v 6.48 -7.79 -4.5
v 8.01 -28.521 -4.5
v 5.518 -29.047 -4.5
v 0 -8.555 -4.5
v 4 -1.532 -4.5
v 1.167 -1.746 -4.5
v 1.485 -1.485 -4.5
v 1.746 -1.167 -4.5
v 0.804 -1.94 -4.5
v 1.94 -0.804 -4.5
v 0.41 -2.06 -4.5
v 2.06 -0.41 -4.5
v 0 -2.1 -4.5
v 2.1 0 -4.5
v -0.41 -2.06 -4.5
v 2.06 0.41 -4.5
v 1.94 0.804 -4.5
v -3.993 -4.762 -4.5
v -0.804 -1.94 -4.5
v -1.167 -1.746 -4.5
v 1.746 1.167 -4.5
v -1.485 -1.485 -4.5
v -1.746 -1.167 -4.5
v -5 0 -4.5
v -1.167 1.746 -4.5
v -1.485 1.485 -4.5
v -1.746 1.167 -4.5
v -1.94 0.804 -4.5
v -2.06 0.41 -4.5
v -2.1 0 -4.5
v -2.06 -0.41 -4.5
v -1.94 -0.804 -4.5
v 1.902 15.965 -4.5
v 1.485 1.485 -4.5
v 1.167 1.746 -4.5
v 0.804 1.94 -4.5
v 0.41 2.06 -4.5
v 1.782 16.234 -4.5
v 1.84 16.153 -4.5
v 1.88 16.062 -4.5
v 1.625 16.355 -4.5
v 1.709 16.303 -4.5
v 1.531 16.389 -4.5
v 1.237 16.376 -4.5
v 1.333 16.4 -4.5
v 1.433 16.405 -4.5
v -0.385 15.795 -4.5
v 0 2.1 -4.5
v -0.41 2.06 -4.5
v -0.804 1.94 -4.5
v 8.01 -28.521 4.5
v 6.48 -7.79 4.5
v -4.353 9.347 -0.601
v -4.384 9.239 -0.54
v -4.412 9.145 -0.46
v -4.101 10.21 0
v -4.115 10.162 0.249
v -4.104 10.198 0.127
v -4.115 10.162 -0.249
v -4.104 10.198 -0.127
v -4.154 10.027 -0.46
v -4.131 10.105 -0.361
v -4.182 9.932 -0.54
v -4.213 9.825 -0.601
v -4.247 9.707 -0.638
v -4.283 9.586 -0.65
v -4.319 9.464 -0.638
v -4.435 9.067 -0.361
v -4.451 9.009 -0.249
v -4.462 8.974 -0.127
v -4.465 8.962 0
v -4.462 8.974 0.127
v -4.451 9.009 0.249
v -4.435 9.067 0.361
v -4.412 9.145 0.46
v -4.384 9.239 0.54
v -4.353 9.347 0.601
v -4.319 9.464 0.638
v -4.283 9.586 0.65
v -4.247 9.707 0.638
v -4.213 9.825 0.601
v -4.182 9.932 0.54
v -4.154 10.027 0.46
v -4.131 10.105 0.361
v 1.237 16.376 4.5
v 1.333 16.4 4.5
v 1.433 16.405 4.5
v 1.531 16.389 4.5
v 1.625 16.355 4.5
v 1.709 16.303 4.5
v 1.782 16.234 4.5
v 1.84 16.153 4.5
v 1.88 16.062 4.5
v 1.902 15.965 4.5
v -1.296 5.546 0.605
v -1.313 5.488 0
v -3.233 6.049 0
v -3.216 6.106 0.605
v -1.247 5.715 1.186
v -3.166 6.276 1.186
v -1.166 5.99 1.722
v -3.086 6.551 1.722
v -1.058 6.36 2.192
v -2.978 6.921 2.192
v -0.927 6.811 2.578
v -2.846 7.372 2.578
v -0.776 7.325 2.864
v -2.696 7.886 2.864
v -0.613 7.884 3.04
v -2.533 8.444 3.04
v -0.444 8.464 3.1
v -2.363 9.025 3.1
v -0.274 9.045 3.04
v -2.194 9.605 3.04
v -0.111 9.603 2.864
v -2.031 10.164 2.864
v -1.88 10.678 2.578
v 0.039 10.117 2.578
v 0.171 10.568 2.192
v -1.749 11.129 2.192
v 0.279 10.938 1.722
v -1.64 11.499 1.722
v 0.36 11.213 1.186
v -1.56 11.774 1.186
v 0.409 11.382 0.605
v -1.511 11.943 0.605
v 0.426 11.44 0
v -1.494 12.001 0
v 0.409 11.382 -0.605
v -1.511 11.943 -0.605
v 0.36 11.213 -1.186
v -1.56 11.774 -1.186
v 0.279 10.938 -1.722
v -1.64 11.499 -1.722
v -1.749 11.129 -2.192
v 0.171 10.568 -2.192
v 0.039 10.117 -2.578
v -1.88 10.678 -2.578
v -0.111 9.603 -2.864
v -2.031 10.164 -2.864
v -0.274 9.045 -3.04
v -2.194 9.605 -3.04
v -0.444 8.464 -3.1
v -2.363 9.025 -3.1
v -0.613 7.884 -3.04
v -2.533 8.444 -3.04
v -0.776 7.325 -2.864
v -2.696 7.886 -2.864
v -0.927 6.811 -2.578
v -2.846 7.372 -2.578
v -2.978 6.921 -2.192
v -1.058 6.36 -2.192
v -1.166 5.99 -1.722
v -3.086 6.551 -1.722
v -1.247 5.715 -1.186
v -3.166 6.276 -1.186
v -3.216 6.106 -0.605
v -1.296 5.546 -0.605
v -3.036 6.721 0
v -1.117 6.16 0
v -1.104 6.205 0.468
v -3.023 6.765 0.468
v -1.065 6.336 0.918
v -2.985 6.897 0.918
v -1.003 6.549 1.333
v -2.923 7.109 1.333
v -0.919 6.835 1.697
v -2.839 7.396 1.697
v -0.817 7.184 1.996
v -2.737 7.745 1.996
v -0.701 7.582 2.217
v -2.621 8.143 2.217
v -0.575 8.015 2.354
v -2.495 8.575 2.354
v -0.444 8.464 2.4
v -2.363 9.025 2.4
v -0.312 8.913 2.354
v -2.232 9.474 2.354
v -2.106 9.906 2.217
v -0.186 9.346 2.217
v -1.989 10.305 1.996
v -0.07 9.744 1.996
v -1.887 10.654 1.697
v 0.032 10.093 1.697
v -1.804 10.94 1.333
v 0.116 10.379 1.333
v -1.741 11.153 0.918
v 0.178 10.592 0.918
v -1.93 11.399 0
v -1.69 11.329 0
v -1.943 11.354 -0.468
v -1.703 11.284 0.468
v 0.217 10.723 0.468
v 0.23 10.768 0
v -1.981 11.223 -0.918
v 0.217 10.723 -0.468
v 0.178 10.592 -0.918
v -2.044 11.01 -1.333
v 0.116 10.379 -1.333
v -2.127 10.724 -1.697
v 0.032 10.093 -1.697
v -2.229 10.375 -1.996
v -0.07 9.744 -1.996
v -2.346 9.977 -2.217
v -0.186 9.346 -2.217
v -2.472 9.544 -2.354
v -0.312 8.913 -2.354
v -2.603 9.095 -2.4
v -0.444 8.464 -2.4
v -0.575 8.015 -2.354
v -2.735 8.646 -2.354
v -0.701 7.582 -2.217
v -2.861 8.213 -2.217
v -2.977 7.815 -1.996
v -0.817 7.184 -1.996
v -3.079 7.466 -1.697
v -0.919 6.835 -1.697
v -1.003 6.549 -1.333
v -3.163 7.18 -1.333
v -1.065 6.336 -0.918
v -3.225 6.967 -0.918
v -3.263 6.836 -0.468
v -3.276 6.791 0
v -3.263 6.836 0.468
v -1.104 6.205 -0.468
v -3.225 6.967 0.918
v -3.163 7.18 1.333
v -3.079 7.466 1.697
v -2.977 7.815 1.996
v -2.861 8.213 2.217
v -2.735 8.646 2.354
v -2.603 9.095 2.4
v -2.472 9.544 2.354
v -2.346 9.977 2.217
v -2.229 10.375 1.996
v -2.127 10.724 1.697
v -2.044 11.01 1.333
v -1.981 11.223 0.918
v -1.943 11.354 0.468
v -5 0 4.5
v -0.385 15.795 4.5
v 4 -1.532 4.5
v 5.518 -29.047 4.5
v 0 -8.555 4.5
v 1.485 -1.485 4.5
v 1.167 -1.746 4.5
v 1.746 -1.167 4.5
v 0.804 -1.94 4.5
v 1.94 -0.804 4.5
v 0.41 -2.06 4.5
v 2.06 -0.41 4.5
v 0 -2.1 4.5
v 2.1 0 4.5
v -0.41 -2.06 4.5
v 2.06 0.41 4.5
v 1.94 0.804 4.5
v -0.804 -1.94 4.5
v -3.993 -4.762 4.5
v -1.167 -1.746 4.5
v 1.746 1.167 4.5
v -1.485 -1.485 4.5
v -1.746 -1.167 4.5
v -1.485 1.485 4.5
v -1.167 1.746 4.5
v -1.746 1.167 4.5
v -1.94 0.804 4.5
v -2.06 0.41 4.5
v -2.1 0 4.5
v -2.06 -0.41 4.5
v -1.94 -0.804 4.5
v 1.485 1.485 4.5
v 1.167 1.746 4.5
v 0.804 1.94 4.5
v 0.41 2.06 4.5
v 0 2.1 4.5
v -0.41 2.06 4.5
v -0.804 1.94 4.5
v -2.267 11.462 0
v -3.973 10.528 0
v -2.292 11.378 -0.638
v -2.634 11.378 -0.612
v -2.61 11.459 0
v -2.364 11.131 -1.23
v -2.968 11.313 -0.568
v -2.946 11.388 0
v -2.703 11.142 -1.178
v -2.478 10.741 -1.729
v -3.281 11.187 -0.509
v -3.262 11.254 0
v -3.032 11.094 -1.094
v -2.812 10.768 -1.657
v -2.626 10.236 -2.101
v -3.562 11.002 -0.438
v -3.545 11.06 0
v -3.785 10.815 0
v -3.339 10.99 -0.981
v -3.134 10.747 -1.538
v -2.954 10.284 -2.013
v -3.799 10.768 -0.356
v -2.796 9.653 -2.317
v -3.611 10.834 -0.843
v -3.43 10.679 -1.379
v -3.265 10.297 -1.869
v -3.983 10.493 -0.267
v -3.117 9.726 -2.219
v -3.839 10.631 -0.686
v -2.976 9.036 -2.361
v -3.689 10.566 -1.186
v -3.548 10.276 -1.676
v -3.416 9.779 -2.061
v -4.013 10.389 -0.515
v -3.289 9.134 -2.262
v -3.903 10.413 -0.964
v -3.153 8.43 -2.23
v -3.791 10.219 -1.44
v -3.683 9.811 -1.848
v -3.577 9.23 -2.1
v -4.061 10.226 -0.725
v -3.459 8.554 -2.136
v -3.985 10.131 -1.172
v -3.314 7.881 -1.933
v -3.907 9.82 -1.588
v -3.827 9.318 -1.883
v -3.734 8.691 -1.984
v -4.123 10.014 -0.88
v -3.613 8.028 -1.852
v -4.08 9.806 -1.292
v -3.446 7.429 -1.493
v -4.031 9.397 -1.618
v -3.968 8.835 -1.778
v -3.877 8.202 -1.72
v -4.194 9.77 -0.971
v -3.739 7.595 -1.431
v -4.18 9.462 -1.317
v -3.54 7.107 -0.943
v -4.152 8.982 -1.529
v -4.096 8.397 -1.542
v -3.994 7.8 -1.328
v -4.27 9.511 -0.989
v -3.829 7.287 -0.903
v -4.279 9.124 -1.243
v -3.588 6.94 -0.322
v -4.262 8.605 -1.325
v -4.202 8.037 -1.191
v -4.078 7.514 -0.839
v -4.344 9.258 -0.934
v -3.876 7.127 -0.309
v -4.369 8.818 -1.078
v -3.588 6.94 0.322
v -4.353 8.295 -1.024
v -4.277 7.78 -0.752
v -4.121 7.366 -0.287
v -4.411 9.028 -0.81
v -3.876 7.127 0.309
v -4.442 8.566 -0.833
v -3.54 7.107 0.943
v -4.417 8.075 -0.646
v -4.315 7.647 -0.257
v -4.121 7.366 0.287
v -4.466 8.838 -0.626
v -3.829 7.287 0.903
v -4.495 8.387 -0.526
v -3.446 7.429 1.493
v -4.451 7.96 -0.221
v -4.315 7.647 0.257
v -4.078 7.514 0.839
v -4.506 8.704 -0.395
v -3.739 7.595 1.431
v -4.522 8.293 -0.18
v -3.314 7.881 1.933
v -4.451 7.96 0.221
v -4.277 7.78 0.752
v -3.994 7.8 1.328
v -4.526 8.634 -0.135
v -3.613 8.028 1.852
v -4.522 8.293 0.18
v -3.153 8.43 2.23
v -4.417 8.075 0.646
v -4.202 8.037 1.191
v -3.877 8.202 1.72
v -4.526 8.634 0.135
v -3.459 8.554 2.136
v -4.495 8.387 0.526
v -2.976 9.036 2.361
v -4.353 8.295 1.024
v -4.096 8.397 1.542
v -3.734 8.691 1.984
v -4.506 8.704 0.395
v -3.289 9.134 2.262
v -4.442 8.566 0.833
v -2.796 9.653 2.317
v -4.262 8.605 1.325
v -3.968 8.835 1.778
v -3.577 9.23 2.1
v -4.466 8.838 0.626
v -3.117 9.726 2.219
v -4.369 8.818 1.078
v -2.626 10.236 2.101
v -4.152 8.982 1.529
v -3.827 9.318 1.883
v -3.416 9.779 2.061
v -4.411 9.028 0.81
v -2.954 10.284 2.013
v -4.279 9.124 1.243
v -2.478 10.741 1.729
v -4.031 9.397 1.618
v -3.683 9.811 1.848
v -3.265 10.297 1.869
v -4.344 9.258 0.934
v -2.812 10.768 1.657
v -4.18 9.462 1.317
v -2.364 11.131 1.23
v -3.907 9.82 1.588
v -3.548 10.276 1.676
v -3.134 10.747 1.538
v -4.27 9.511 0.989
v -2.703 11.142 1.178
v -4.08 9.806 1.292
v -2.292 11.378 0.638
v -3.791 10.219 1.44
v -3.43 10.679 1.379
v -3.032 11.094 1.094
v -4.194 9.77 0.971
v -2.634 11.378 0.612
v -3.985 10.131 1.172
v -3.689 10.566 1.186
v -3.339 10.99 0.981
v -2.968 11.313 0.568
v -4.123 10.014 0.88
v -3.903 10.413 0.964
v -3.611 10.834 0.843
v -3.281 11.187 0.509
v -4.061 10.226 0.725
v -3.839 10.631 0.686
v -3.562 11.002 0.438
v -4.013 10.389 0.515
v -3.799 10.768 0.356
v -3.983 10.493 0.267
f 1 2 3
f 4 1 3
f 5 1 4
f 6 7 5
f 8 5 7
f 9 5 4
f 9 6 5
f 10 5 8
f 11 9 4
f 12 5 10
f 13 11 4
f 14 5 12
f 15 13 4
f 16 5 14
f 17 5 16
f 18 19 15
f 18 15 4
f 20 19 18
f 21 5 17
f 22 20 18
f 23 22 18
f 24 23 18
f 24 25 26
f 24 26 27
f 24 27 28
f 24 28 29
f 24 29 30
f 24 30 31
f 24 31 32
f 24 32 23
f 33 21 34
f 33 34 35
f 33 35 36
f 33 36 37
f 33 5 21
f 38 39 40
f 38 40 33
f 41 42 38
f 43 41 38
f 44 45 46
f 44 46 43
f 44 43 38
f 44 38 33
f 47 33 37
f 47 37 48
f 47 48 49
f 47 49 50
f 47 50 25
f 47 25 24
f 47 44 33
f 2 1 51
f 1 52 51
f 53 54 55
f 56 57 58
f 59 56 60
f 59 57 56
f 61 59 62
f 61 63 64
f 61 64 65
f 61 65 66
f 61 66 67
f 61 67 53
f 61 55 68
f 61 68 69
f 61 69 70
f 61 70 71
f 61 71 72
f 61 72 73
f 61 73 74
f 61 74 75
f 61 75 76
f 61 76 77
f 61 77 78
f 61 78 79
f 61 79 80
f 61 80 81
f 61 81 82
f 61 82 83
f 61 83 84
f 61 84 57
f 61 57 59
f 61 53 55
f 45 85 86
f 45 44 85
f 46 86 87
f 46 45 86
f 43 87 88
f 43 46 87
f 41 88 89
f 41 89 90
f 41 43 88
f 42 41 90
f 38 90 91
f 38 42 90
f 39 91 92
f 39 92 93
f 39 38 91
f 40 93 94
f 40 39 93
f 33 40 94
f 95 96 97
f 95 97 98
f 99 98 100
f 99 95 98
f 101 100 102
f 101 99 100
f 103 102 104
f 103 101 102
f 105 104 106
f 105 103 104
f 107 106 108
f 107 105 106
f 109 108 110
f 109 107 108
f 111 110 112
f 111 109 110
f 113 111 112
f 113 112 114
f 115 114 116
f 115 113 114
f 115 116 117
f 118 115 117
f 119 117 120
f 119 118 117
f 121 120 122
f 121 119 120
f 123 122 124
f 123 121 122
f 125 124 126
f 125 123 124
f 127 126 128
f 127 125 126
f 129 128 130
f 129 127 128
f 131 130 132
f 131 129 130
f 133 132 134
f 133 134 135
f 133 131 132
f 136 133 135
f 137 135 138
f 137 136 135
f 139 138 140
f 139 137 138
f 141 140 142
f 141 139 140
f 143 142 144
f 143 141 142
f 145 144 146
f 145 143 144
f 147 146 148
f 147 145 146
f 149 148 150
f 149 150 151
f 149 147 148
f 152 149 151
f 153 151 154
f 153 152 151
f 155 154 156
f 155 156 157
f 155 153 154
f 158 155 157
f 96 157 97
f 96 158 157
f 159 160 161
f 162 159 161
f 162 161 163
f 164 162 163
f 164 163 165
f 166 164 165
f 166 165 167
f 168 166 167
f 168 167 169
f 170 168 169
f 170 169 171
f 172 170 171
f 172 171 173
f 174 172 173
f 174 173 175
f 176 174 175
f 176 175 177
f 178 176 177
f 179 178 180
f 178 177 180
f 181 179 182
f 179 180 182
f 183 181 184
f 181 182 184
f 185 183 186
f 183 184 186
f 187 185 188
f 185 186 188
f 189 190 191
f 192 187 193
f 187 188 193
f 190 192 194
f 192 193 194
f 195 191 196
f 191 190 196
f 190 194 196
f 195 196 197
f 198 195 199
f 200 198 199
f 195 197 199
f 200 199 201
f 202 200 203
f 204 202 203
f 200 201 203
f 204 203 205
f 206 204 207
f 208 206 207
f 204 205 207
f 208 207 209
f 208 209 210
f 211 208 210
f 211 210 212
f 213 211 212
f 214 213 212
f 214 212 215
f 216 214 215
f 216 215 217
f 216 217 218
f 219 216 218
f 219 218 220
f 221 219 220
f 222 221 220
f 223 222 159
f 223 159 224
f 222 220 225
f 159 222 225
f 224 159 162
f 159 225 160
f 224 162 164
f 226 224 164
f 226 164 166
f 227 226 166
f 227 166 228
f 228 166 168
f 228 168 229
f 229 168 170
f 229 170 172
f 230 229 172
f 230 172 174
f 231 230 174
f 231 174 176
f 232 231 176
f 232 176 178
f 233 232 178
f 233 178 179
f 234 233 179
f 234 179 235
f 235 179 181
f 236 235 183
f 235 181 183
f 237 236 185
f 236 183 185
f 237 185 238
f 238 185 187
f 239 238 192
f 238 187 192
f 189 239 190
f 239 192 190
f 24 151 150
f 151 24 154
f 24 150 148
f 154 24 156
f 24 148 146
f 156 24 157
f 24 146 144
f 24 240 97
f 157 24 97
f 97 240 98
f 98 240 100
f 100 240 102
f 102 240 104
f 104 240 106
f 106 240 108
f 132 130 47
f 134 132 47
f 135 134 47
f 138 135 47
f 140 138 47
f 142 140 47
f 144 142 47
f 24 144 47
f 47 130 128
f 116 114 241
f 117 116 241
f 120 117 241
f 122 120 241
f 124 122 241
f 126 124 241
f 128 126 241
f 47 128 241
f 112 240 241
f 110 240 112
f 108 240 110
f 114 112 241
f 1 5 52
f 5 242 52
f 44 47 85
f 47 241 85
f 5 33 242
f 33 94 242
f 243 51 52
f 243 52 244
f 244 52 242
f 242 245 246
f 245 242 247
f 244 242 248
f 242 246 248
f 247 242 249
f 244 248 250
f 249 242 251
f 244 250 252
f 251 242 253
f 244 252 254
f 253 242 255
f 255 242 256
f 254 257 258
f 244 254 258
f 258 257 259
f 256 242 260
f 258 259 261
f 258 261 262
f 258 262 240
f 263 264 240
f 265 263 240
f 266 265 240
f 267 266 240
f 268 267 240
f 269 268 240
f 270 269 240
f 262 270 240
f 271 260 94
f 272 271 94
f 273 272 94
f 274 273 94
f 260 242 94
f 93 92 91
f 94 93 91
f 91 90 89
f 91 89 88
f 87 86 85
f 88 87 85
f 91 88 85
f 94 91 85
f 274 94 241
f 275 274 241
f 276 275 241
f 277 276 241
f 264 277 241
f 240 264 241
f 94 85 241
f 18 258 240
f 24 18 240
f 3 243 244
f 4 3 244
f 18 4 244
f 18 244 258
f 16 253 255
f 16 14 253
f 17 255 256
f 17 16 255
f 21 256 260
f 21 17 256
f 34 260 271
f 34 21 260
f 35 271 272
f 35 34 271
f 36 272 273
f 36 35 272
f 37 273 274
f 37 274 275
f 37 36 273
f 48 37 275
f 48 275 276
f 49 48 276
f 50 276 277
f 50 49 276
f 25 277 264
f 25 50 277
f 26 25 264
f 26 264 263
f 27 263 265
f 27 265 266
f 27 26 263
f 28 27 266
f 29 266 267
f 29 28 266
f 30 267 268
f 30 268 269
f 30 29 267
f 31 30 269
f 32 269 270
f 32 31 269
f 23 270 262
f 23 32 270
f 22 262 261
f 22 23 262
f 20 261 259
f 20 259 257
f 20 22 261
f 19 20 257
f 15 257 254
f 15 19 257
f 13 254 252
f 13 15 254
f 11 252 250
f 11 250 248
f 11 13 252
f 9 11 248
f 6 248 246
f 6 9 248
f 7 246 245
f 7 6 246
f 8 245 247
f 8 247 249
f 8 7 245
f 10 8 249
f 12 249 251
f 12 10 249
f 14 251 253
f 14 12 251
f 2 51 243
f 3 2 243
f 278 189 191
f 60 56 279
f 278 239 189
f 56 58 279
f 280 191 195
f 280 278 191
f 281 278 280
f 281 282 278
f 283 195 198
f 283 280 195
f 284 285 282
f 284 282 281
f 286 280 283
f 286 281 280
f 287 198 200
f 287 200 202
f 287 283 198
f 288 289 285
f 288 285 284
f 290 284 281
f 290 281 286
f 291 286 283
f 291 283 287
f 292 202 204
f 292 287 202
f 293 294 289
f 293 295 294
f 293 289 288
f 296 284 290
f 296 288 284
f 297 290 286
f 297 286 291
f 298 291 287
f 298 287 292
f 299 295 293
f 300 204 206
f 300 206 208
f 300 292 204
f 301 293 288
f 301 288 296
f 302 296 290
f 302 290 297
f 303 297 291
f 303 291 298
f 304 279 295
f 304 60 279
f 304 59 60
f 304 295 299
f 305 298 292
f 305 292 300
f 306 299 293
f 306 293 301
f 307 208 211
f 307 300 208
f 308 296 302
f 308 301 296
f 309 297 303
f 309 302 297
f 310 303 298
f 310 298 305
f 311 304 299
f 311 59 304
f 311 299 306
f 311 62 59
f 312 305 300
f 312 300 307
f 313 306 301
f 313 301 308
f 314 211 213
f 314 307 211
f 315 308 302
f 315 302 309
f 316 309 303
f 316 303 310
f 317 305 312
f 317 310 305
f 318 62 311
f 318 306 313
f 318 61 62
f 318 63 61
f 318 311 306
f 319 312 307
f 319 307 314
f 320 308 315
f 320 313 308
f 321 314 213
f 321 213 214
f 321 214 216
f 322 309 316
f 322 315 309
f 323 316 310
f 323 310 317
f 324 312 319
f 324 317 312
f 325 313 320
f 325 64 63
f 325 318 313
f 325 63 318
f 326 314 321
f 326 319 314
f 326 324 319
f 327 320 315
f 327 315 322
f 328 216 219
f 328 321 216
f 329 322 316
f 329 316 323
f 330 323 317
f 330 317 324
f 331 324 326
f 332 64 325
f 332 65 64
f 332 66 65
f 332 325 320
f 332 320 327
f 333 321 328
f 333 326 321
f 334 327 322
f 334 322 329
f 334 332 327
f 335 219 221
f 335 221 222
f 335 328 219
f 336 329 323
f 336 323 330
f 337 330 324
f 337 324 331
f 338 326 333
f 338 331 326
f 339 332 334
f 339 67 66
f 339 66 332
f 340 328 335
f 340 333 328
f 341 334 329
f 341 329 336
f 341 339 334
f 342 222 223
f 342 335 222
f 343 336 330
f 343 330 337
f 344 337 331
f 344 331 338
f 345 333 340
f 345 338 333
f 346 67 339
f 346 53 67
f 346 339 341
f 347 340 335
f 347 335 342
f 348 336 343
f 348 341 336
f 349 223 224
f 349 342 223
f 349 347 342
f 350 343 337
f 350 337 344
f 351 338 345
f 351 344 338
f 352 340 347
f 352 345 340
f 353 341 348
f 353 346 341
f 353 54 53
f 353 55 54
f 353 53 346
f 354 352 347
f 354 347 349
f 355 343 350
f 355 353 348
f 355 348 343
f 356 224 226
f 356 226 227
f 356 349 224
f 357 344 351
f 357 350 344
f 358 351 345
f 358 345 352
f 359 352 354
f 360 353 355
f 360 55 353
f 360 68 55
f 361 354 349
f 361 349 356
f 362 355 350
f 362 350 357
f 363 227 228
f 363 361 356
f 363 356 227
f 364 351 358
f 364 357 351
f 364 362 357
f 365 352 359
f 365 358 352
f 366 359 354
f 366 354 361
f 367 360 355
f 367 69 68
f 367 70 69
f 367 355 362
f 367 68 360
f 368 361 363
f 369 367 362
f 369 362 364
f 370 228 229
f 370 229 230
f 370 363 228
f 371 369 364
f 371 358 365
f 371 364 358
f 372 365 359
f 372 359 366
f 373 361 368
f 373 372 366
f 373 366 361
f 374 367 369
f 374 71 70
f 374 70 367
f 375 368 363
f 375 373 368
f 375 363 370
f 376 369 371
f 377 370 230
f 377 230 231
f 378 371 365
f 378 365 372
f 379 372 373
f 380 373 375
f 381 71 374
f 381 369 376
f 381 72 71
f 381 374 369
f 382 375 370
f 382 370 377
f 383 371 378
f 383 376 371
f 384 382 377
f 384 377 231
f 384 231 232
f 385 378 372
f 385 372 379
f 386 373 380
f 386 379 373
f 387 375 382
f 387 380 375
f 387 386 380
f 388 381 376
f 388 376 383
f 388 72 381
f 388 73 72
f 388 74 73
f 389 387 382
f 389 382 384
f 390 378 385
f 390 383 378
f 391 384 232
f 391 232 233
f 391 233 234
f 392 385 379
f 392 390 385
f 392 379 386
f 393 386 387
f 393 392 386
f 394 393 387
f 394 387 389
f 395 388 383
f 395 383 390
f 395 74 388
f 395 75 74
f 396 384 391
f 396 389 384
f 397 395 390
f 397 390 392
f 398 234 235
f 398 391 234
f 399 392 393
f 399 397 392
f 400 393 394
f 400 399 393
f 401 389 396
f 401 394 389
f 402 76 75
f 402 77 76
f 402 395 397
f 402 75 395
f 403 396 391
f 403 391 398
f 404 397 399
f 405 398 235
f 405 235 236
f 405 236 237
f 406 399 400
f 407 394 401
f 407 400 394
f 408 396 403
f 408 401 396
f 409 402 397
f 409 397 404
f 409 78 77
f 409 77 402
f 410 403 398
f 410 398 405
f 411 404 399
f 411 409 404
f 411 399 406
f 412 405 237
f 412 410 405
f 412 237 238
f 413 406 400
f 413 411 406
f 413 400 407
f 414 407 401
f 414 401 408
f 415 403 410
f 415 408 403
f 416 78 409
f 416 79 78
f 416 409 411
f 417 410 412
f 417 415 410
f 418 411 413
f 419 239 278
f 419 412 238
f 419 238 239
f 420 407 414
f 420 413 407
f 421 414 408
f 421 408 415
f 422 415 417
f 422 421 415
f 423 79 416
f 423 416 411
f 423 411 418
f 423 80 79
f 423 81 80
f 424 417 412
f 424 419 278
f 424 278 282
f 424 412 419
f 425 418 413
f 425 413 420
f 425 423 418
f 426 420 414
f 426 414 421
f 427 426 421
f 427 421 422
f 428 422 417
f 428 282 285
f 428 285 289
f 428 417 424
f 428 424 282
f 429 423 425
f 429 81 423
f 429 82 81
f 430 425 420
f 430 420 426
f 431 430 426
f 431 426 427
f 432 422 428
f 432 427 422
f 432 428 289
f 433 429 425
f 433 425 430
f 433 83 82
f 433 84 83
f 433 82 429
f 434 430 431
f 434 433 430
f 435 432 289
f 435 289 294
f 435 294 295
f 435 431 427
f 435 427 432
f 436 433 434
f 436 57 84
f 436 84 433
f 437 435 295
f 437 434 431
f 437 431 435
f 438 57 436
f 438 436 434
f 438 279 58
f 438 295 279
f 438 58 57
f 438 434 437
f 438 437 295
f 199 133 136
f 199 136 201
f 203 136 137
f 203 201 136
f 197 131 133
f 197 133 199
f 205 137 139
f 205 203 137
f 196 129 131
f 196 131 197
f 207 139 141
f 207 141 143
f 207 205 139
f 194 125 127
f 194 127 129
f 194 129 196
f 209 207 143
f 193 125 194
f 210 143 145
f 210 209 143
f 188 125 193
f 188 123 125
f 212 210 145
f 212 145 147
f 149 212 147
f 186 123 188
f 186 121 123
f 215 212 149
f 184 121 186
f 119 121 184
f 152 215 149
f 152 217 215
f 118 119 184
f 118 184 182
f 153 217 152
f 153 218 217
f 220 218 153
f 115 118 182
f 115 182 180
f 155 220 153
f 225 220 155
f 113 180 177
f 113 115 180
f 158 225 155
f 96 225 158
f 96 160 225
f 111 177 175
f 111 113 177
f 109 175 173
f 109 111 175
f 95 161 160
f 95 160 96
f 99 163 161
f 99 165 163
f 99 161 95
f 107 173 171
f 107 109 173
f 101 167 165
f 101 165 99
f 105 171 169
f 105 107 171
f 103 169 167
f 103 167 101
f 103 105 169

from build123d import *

# Parameters (mm, degrees)
SKETCH_1_R          = 2.1
EXTRUDE_1_DEPTH     = 4.5
SKETCH_2_R          = 2.4
EXTRUDE_2_DEPTH     = 2
FILLET_1_R          = 1.75
CUT_EXTRUDE_START   = -2
SKETCH_3_R          = 3.1
SKETCH_3_R_2        = 2.4
CUT_EXTRUDE_1_DEPTH = 2
FILLET_3_R          = 0.5


with BuildPart() as part:
    # 스케치1 → 보스-돌출1 (new, symmetric)
    with BuildSketch(Plane.XY):
        Polygon((-5, 0), (-0.385221799, 15.795303231), (1.827127146, 16.587775404), (4, -1.531866144), (6.479836305, -7.789788004), (8.009600242, -28.520515794), (5.517735363, -29.047476782), (0, -8.554669972), (-3.992979216, -4.761945907), align=None)
        Circle(SKETCH_1_R, mode=Mode.SUBTRACT)
    extrude(amount=EXTRUDE_1_DEPTH, both=True)

    # 스케치2 → 보스-돌출2 (add)
    with BuildSketch(Plane(origin=(-4.606773657, 1.345921527, 0), x_dir=(0, 0, 1), z_dir=(-0.9598722474471307, 0.2804376375966574, 0))):
        with Locations(Location((0, 8, 0), (0, 0, 90))):
            Circle(SKETCH_2_R)
    extrude(amount=EXTRUDE_2_DEPTH)

    # 필렛1
    fillet_1_edges = [part.edges().sort_by_distance(p)[0] for p in [
        (-4.956067381, 7.282081388, 0),
    ]]
    fillet(fillet_1_edges, radius=FILLET_1_R)

    # 스케치3 → 컷-돌출1 (cut)
    with BuildSketch(Plane(origin=(-4.606773657, 1.345921527, 0), x_dir=(0, 0, 1), z_dir=(-0.9598722474471308, 0.28043763759665746, 0)).offset(CUT_EXTRUDE_START)):
        with Locations(Location((0, 8, 0), (0, 0, 270))):
            Circle(SKETCH_3_R)
        with Locations(Location((0, 8, 0), (0, 0, 270))):
            Circle(SKETCH_3_R_2, mode=Mode.SUBTRACT)
    extrude(amount=CUT_EXTRUDE_1_DEPTH, mode=Mode.SUBTRACT)

    # 필렛3
    fillet_3_edges = [part.edges().sort_by_distance(p)[0] for p in [
        (1.827127146, 16.587775404, 0),
    ]]
    fillet(fillet_3_edges, radius=FILLET_3_R)


solid = part.part
